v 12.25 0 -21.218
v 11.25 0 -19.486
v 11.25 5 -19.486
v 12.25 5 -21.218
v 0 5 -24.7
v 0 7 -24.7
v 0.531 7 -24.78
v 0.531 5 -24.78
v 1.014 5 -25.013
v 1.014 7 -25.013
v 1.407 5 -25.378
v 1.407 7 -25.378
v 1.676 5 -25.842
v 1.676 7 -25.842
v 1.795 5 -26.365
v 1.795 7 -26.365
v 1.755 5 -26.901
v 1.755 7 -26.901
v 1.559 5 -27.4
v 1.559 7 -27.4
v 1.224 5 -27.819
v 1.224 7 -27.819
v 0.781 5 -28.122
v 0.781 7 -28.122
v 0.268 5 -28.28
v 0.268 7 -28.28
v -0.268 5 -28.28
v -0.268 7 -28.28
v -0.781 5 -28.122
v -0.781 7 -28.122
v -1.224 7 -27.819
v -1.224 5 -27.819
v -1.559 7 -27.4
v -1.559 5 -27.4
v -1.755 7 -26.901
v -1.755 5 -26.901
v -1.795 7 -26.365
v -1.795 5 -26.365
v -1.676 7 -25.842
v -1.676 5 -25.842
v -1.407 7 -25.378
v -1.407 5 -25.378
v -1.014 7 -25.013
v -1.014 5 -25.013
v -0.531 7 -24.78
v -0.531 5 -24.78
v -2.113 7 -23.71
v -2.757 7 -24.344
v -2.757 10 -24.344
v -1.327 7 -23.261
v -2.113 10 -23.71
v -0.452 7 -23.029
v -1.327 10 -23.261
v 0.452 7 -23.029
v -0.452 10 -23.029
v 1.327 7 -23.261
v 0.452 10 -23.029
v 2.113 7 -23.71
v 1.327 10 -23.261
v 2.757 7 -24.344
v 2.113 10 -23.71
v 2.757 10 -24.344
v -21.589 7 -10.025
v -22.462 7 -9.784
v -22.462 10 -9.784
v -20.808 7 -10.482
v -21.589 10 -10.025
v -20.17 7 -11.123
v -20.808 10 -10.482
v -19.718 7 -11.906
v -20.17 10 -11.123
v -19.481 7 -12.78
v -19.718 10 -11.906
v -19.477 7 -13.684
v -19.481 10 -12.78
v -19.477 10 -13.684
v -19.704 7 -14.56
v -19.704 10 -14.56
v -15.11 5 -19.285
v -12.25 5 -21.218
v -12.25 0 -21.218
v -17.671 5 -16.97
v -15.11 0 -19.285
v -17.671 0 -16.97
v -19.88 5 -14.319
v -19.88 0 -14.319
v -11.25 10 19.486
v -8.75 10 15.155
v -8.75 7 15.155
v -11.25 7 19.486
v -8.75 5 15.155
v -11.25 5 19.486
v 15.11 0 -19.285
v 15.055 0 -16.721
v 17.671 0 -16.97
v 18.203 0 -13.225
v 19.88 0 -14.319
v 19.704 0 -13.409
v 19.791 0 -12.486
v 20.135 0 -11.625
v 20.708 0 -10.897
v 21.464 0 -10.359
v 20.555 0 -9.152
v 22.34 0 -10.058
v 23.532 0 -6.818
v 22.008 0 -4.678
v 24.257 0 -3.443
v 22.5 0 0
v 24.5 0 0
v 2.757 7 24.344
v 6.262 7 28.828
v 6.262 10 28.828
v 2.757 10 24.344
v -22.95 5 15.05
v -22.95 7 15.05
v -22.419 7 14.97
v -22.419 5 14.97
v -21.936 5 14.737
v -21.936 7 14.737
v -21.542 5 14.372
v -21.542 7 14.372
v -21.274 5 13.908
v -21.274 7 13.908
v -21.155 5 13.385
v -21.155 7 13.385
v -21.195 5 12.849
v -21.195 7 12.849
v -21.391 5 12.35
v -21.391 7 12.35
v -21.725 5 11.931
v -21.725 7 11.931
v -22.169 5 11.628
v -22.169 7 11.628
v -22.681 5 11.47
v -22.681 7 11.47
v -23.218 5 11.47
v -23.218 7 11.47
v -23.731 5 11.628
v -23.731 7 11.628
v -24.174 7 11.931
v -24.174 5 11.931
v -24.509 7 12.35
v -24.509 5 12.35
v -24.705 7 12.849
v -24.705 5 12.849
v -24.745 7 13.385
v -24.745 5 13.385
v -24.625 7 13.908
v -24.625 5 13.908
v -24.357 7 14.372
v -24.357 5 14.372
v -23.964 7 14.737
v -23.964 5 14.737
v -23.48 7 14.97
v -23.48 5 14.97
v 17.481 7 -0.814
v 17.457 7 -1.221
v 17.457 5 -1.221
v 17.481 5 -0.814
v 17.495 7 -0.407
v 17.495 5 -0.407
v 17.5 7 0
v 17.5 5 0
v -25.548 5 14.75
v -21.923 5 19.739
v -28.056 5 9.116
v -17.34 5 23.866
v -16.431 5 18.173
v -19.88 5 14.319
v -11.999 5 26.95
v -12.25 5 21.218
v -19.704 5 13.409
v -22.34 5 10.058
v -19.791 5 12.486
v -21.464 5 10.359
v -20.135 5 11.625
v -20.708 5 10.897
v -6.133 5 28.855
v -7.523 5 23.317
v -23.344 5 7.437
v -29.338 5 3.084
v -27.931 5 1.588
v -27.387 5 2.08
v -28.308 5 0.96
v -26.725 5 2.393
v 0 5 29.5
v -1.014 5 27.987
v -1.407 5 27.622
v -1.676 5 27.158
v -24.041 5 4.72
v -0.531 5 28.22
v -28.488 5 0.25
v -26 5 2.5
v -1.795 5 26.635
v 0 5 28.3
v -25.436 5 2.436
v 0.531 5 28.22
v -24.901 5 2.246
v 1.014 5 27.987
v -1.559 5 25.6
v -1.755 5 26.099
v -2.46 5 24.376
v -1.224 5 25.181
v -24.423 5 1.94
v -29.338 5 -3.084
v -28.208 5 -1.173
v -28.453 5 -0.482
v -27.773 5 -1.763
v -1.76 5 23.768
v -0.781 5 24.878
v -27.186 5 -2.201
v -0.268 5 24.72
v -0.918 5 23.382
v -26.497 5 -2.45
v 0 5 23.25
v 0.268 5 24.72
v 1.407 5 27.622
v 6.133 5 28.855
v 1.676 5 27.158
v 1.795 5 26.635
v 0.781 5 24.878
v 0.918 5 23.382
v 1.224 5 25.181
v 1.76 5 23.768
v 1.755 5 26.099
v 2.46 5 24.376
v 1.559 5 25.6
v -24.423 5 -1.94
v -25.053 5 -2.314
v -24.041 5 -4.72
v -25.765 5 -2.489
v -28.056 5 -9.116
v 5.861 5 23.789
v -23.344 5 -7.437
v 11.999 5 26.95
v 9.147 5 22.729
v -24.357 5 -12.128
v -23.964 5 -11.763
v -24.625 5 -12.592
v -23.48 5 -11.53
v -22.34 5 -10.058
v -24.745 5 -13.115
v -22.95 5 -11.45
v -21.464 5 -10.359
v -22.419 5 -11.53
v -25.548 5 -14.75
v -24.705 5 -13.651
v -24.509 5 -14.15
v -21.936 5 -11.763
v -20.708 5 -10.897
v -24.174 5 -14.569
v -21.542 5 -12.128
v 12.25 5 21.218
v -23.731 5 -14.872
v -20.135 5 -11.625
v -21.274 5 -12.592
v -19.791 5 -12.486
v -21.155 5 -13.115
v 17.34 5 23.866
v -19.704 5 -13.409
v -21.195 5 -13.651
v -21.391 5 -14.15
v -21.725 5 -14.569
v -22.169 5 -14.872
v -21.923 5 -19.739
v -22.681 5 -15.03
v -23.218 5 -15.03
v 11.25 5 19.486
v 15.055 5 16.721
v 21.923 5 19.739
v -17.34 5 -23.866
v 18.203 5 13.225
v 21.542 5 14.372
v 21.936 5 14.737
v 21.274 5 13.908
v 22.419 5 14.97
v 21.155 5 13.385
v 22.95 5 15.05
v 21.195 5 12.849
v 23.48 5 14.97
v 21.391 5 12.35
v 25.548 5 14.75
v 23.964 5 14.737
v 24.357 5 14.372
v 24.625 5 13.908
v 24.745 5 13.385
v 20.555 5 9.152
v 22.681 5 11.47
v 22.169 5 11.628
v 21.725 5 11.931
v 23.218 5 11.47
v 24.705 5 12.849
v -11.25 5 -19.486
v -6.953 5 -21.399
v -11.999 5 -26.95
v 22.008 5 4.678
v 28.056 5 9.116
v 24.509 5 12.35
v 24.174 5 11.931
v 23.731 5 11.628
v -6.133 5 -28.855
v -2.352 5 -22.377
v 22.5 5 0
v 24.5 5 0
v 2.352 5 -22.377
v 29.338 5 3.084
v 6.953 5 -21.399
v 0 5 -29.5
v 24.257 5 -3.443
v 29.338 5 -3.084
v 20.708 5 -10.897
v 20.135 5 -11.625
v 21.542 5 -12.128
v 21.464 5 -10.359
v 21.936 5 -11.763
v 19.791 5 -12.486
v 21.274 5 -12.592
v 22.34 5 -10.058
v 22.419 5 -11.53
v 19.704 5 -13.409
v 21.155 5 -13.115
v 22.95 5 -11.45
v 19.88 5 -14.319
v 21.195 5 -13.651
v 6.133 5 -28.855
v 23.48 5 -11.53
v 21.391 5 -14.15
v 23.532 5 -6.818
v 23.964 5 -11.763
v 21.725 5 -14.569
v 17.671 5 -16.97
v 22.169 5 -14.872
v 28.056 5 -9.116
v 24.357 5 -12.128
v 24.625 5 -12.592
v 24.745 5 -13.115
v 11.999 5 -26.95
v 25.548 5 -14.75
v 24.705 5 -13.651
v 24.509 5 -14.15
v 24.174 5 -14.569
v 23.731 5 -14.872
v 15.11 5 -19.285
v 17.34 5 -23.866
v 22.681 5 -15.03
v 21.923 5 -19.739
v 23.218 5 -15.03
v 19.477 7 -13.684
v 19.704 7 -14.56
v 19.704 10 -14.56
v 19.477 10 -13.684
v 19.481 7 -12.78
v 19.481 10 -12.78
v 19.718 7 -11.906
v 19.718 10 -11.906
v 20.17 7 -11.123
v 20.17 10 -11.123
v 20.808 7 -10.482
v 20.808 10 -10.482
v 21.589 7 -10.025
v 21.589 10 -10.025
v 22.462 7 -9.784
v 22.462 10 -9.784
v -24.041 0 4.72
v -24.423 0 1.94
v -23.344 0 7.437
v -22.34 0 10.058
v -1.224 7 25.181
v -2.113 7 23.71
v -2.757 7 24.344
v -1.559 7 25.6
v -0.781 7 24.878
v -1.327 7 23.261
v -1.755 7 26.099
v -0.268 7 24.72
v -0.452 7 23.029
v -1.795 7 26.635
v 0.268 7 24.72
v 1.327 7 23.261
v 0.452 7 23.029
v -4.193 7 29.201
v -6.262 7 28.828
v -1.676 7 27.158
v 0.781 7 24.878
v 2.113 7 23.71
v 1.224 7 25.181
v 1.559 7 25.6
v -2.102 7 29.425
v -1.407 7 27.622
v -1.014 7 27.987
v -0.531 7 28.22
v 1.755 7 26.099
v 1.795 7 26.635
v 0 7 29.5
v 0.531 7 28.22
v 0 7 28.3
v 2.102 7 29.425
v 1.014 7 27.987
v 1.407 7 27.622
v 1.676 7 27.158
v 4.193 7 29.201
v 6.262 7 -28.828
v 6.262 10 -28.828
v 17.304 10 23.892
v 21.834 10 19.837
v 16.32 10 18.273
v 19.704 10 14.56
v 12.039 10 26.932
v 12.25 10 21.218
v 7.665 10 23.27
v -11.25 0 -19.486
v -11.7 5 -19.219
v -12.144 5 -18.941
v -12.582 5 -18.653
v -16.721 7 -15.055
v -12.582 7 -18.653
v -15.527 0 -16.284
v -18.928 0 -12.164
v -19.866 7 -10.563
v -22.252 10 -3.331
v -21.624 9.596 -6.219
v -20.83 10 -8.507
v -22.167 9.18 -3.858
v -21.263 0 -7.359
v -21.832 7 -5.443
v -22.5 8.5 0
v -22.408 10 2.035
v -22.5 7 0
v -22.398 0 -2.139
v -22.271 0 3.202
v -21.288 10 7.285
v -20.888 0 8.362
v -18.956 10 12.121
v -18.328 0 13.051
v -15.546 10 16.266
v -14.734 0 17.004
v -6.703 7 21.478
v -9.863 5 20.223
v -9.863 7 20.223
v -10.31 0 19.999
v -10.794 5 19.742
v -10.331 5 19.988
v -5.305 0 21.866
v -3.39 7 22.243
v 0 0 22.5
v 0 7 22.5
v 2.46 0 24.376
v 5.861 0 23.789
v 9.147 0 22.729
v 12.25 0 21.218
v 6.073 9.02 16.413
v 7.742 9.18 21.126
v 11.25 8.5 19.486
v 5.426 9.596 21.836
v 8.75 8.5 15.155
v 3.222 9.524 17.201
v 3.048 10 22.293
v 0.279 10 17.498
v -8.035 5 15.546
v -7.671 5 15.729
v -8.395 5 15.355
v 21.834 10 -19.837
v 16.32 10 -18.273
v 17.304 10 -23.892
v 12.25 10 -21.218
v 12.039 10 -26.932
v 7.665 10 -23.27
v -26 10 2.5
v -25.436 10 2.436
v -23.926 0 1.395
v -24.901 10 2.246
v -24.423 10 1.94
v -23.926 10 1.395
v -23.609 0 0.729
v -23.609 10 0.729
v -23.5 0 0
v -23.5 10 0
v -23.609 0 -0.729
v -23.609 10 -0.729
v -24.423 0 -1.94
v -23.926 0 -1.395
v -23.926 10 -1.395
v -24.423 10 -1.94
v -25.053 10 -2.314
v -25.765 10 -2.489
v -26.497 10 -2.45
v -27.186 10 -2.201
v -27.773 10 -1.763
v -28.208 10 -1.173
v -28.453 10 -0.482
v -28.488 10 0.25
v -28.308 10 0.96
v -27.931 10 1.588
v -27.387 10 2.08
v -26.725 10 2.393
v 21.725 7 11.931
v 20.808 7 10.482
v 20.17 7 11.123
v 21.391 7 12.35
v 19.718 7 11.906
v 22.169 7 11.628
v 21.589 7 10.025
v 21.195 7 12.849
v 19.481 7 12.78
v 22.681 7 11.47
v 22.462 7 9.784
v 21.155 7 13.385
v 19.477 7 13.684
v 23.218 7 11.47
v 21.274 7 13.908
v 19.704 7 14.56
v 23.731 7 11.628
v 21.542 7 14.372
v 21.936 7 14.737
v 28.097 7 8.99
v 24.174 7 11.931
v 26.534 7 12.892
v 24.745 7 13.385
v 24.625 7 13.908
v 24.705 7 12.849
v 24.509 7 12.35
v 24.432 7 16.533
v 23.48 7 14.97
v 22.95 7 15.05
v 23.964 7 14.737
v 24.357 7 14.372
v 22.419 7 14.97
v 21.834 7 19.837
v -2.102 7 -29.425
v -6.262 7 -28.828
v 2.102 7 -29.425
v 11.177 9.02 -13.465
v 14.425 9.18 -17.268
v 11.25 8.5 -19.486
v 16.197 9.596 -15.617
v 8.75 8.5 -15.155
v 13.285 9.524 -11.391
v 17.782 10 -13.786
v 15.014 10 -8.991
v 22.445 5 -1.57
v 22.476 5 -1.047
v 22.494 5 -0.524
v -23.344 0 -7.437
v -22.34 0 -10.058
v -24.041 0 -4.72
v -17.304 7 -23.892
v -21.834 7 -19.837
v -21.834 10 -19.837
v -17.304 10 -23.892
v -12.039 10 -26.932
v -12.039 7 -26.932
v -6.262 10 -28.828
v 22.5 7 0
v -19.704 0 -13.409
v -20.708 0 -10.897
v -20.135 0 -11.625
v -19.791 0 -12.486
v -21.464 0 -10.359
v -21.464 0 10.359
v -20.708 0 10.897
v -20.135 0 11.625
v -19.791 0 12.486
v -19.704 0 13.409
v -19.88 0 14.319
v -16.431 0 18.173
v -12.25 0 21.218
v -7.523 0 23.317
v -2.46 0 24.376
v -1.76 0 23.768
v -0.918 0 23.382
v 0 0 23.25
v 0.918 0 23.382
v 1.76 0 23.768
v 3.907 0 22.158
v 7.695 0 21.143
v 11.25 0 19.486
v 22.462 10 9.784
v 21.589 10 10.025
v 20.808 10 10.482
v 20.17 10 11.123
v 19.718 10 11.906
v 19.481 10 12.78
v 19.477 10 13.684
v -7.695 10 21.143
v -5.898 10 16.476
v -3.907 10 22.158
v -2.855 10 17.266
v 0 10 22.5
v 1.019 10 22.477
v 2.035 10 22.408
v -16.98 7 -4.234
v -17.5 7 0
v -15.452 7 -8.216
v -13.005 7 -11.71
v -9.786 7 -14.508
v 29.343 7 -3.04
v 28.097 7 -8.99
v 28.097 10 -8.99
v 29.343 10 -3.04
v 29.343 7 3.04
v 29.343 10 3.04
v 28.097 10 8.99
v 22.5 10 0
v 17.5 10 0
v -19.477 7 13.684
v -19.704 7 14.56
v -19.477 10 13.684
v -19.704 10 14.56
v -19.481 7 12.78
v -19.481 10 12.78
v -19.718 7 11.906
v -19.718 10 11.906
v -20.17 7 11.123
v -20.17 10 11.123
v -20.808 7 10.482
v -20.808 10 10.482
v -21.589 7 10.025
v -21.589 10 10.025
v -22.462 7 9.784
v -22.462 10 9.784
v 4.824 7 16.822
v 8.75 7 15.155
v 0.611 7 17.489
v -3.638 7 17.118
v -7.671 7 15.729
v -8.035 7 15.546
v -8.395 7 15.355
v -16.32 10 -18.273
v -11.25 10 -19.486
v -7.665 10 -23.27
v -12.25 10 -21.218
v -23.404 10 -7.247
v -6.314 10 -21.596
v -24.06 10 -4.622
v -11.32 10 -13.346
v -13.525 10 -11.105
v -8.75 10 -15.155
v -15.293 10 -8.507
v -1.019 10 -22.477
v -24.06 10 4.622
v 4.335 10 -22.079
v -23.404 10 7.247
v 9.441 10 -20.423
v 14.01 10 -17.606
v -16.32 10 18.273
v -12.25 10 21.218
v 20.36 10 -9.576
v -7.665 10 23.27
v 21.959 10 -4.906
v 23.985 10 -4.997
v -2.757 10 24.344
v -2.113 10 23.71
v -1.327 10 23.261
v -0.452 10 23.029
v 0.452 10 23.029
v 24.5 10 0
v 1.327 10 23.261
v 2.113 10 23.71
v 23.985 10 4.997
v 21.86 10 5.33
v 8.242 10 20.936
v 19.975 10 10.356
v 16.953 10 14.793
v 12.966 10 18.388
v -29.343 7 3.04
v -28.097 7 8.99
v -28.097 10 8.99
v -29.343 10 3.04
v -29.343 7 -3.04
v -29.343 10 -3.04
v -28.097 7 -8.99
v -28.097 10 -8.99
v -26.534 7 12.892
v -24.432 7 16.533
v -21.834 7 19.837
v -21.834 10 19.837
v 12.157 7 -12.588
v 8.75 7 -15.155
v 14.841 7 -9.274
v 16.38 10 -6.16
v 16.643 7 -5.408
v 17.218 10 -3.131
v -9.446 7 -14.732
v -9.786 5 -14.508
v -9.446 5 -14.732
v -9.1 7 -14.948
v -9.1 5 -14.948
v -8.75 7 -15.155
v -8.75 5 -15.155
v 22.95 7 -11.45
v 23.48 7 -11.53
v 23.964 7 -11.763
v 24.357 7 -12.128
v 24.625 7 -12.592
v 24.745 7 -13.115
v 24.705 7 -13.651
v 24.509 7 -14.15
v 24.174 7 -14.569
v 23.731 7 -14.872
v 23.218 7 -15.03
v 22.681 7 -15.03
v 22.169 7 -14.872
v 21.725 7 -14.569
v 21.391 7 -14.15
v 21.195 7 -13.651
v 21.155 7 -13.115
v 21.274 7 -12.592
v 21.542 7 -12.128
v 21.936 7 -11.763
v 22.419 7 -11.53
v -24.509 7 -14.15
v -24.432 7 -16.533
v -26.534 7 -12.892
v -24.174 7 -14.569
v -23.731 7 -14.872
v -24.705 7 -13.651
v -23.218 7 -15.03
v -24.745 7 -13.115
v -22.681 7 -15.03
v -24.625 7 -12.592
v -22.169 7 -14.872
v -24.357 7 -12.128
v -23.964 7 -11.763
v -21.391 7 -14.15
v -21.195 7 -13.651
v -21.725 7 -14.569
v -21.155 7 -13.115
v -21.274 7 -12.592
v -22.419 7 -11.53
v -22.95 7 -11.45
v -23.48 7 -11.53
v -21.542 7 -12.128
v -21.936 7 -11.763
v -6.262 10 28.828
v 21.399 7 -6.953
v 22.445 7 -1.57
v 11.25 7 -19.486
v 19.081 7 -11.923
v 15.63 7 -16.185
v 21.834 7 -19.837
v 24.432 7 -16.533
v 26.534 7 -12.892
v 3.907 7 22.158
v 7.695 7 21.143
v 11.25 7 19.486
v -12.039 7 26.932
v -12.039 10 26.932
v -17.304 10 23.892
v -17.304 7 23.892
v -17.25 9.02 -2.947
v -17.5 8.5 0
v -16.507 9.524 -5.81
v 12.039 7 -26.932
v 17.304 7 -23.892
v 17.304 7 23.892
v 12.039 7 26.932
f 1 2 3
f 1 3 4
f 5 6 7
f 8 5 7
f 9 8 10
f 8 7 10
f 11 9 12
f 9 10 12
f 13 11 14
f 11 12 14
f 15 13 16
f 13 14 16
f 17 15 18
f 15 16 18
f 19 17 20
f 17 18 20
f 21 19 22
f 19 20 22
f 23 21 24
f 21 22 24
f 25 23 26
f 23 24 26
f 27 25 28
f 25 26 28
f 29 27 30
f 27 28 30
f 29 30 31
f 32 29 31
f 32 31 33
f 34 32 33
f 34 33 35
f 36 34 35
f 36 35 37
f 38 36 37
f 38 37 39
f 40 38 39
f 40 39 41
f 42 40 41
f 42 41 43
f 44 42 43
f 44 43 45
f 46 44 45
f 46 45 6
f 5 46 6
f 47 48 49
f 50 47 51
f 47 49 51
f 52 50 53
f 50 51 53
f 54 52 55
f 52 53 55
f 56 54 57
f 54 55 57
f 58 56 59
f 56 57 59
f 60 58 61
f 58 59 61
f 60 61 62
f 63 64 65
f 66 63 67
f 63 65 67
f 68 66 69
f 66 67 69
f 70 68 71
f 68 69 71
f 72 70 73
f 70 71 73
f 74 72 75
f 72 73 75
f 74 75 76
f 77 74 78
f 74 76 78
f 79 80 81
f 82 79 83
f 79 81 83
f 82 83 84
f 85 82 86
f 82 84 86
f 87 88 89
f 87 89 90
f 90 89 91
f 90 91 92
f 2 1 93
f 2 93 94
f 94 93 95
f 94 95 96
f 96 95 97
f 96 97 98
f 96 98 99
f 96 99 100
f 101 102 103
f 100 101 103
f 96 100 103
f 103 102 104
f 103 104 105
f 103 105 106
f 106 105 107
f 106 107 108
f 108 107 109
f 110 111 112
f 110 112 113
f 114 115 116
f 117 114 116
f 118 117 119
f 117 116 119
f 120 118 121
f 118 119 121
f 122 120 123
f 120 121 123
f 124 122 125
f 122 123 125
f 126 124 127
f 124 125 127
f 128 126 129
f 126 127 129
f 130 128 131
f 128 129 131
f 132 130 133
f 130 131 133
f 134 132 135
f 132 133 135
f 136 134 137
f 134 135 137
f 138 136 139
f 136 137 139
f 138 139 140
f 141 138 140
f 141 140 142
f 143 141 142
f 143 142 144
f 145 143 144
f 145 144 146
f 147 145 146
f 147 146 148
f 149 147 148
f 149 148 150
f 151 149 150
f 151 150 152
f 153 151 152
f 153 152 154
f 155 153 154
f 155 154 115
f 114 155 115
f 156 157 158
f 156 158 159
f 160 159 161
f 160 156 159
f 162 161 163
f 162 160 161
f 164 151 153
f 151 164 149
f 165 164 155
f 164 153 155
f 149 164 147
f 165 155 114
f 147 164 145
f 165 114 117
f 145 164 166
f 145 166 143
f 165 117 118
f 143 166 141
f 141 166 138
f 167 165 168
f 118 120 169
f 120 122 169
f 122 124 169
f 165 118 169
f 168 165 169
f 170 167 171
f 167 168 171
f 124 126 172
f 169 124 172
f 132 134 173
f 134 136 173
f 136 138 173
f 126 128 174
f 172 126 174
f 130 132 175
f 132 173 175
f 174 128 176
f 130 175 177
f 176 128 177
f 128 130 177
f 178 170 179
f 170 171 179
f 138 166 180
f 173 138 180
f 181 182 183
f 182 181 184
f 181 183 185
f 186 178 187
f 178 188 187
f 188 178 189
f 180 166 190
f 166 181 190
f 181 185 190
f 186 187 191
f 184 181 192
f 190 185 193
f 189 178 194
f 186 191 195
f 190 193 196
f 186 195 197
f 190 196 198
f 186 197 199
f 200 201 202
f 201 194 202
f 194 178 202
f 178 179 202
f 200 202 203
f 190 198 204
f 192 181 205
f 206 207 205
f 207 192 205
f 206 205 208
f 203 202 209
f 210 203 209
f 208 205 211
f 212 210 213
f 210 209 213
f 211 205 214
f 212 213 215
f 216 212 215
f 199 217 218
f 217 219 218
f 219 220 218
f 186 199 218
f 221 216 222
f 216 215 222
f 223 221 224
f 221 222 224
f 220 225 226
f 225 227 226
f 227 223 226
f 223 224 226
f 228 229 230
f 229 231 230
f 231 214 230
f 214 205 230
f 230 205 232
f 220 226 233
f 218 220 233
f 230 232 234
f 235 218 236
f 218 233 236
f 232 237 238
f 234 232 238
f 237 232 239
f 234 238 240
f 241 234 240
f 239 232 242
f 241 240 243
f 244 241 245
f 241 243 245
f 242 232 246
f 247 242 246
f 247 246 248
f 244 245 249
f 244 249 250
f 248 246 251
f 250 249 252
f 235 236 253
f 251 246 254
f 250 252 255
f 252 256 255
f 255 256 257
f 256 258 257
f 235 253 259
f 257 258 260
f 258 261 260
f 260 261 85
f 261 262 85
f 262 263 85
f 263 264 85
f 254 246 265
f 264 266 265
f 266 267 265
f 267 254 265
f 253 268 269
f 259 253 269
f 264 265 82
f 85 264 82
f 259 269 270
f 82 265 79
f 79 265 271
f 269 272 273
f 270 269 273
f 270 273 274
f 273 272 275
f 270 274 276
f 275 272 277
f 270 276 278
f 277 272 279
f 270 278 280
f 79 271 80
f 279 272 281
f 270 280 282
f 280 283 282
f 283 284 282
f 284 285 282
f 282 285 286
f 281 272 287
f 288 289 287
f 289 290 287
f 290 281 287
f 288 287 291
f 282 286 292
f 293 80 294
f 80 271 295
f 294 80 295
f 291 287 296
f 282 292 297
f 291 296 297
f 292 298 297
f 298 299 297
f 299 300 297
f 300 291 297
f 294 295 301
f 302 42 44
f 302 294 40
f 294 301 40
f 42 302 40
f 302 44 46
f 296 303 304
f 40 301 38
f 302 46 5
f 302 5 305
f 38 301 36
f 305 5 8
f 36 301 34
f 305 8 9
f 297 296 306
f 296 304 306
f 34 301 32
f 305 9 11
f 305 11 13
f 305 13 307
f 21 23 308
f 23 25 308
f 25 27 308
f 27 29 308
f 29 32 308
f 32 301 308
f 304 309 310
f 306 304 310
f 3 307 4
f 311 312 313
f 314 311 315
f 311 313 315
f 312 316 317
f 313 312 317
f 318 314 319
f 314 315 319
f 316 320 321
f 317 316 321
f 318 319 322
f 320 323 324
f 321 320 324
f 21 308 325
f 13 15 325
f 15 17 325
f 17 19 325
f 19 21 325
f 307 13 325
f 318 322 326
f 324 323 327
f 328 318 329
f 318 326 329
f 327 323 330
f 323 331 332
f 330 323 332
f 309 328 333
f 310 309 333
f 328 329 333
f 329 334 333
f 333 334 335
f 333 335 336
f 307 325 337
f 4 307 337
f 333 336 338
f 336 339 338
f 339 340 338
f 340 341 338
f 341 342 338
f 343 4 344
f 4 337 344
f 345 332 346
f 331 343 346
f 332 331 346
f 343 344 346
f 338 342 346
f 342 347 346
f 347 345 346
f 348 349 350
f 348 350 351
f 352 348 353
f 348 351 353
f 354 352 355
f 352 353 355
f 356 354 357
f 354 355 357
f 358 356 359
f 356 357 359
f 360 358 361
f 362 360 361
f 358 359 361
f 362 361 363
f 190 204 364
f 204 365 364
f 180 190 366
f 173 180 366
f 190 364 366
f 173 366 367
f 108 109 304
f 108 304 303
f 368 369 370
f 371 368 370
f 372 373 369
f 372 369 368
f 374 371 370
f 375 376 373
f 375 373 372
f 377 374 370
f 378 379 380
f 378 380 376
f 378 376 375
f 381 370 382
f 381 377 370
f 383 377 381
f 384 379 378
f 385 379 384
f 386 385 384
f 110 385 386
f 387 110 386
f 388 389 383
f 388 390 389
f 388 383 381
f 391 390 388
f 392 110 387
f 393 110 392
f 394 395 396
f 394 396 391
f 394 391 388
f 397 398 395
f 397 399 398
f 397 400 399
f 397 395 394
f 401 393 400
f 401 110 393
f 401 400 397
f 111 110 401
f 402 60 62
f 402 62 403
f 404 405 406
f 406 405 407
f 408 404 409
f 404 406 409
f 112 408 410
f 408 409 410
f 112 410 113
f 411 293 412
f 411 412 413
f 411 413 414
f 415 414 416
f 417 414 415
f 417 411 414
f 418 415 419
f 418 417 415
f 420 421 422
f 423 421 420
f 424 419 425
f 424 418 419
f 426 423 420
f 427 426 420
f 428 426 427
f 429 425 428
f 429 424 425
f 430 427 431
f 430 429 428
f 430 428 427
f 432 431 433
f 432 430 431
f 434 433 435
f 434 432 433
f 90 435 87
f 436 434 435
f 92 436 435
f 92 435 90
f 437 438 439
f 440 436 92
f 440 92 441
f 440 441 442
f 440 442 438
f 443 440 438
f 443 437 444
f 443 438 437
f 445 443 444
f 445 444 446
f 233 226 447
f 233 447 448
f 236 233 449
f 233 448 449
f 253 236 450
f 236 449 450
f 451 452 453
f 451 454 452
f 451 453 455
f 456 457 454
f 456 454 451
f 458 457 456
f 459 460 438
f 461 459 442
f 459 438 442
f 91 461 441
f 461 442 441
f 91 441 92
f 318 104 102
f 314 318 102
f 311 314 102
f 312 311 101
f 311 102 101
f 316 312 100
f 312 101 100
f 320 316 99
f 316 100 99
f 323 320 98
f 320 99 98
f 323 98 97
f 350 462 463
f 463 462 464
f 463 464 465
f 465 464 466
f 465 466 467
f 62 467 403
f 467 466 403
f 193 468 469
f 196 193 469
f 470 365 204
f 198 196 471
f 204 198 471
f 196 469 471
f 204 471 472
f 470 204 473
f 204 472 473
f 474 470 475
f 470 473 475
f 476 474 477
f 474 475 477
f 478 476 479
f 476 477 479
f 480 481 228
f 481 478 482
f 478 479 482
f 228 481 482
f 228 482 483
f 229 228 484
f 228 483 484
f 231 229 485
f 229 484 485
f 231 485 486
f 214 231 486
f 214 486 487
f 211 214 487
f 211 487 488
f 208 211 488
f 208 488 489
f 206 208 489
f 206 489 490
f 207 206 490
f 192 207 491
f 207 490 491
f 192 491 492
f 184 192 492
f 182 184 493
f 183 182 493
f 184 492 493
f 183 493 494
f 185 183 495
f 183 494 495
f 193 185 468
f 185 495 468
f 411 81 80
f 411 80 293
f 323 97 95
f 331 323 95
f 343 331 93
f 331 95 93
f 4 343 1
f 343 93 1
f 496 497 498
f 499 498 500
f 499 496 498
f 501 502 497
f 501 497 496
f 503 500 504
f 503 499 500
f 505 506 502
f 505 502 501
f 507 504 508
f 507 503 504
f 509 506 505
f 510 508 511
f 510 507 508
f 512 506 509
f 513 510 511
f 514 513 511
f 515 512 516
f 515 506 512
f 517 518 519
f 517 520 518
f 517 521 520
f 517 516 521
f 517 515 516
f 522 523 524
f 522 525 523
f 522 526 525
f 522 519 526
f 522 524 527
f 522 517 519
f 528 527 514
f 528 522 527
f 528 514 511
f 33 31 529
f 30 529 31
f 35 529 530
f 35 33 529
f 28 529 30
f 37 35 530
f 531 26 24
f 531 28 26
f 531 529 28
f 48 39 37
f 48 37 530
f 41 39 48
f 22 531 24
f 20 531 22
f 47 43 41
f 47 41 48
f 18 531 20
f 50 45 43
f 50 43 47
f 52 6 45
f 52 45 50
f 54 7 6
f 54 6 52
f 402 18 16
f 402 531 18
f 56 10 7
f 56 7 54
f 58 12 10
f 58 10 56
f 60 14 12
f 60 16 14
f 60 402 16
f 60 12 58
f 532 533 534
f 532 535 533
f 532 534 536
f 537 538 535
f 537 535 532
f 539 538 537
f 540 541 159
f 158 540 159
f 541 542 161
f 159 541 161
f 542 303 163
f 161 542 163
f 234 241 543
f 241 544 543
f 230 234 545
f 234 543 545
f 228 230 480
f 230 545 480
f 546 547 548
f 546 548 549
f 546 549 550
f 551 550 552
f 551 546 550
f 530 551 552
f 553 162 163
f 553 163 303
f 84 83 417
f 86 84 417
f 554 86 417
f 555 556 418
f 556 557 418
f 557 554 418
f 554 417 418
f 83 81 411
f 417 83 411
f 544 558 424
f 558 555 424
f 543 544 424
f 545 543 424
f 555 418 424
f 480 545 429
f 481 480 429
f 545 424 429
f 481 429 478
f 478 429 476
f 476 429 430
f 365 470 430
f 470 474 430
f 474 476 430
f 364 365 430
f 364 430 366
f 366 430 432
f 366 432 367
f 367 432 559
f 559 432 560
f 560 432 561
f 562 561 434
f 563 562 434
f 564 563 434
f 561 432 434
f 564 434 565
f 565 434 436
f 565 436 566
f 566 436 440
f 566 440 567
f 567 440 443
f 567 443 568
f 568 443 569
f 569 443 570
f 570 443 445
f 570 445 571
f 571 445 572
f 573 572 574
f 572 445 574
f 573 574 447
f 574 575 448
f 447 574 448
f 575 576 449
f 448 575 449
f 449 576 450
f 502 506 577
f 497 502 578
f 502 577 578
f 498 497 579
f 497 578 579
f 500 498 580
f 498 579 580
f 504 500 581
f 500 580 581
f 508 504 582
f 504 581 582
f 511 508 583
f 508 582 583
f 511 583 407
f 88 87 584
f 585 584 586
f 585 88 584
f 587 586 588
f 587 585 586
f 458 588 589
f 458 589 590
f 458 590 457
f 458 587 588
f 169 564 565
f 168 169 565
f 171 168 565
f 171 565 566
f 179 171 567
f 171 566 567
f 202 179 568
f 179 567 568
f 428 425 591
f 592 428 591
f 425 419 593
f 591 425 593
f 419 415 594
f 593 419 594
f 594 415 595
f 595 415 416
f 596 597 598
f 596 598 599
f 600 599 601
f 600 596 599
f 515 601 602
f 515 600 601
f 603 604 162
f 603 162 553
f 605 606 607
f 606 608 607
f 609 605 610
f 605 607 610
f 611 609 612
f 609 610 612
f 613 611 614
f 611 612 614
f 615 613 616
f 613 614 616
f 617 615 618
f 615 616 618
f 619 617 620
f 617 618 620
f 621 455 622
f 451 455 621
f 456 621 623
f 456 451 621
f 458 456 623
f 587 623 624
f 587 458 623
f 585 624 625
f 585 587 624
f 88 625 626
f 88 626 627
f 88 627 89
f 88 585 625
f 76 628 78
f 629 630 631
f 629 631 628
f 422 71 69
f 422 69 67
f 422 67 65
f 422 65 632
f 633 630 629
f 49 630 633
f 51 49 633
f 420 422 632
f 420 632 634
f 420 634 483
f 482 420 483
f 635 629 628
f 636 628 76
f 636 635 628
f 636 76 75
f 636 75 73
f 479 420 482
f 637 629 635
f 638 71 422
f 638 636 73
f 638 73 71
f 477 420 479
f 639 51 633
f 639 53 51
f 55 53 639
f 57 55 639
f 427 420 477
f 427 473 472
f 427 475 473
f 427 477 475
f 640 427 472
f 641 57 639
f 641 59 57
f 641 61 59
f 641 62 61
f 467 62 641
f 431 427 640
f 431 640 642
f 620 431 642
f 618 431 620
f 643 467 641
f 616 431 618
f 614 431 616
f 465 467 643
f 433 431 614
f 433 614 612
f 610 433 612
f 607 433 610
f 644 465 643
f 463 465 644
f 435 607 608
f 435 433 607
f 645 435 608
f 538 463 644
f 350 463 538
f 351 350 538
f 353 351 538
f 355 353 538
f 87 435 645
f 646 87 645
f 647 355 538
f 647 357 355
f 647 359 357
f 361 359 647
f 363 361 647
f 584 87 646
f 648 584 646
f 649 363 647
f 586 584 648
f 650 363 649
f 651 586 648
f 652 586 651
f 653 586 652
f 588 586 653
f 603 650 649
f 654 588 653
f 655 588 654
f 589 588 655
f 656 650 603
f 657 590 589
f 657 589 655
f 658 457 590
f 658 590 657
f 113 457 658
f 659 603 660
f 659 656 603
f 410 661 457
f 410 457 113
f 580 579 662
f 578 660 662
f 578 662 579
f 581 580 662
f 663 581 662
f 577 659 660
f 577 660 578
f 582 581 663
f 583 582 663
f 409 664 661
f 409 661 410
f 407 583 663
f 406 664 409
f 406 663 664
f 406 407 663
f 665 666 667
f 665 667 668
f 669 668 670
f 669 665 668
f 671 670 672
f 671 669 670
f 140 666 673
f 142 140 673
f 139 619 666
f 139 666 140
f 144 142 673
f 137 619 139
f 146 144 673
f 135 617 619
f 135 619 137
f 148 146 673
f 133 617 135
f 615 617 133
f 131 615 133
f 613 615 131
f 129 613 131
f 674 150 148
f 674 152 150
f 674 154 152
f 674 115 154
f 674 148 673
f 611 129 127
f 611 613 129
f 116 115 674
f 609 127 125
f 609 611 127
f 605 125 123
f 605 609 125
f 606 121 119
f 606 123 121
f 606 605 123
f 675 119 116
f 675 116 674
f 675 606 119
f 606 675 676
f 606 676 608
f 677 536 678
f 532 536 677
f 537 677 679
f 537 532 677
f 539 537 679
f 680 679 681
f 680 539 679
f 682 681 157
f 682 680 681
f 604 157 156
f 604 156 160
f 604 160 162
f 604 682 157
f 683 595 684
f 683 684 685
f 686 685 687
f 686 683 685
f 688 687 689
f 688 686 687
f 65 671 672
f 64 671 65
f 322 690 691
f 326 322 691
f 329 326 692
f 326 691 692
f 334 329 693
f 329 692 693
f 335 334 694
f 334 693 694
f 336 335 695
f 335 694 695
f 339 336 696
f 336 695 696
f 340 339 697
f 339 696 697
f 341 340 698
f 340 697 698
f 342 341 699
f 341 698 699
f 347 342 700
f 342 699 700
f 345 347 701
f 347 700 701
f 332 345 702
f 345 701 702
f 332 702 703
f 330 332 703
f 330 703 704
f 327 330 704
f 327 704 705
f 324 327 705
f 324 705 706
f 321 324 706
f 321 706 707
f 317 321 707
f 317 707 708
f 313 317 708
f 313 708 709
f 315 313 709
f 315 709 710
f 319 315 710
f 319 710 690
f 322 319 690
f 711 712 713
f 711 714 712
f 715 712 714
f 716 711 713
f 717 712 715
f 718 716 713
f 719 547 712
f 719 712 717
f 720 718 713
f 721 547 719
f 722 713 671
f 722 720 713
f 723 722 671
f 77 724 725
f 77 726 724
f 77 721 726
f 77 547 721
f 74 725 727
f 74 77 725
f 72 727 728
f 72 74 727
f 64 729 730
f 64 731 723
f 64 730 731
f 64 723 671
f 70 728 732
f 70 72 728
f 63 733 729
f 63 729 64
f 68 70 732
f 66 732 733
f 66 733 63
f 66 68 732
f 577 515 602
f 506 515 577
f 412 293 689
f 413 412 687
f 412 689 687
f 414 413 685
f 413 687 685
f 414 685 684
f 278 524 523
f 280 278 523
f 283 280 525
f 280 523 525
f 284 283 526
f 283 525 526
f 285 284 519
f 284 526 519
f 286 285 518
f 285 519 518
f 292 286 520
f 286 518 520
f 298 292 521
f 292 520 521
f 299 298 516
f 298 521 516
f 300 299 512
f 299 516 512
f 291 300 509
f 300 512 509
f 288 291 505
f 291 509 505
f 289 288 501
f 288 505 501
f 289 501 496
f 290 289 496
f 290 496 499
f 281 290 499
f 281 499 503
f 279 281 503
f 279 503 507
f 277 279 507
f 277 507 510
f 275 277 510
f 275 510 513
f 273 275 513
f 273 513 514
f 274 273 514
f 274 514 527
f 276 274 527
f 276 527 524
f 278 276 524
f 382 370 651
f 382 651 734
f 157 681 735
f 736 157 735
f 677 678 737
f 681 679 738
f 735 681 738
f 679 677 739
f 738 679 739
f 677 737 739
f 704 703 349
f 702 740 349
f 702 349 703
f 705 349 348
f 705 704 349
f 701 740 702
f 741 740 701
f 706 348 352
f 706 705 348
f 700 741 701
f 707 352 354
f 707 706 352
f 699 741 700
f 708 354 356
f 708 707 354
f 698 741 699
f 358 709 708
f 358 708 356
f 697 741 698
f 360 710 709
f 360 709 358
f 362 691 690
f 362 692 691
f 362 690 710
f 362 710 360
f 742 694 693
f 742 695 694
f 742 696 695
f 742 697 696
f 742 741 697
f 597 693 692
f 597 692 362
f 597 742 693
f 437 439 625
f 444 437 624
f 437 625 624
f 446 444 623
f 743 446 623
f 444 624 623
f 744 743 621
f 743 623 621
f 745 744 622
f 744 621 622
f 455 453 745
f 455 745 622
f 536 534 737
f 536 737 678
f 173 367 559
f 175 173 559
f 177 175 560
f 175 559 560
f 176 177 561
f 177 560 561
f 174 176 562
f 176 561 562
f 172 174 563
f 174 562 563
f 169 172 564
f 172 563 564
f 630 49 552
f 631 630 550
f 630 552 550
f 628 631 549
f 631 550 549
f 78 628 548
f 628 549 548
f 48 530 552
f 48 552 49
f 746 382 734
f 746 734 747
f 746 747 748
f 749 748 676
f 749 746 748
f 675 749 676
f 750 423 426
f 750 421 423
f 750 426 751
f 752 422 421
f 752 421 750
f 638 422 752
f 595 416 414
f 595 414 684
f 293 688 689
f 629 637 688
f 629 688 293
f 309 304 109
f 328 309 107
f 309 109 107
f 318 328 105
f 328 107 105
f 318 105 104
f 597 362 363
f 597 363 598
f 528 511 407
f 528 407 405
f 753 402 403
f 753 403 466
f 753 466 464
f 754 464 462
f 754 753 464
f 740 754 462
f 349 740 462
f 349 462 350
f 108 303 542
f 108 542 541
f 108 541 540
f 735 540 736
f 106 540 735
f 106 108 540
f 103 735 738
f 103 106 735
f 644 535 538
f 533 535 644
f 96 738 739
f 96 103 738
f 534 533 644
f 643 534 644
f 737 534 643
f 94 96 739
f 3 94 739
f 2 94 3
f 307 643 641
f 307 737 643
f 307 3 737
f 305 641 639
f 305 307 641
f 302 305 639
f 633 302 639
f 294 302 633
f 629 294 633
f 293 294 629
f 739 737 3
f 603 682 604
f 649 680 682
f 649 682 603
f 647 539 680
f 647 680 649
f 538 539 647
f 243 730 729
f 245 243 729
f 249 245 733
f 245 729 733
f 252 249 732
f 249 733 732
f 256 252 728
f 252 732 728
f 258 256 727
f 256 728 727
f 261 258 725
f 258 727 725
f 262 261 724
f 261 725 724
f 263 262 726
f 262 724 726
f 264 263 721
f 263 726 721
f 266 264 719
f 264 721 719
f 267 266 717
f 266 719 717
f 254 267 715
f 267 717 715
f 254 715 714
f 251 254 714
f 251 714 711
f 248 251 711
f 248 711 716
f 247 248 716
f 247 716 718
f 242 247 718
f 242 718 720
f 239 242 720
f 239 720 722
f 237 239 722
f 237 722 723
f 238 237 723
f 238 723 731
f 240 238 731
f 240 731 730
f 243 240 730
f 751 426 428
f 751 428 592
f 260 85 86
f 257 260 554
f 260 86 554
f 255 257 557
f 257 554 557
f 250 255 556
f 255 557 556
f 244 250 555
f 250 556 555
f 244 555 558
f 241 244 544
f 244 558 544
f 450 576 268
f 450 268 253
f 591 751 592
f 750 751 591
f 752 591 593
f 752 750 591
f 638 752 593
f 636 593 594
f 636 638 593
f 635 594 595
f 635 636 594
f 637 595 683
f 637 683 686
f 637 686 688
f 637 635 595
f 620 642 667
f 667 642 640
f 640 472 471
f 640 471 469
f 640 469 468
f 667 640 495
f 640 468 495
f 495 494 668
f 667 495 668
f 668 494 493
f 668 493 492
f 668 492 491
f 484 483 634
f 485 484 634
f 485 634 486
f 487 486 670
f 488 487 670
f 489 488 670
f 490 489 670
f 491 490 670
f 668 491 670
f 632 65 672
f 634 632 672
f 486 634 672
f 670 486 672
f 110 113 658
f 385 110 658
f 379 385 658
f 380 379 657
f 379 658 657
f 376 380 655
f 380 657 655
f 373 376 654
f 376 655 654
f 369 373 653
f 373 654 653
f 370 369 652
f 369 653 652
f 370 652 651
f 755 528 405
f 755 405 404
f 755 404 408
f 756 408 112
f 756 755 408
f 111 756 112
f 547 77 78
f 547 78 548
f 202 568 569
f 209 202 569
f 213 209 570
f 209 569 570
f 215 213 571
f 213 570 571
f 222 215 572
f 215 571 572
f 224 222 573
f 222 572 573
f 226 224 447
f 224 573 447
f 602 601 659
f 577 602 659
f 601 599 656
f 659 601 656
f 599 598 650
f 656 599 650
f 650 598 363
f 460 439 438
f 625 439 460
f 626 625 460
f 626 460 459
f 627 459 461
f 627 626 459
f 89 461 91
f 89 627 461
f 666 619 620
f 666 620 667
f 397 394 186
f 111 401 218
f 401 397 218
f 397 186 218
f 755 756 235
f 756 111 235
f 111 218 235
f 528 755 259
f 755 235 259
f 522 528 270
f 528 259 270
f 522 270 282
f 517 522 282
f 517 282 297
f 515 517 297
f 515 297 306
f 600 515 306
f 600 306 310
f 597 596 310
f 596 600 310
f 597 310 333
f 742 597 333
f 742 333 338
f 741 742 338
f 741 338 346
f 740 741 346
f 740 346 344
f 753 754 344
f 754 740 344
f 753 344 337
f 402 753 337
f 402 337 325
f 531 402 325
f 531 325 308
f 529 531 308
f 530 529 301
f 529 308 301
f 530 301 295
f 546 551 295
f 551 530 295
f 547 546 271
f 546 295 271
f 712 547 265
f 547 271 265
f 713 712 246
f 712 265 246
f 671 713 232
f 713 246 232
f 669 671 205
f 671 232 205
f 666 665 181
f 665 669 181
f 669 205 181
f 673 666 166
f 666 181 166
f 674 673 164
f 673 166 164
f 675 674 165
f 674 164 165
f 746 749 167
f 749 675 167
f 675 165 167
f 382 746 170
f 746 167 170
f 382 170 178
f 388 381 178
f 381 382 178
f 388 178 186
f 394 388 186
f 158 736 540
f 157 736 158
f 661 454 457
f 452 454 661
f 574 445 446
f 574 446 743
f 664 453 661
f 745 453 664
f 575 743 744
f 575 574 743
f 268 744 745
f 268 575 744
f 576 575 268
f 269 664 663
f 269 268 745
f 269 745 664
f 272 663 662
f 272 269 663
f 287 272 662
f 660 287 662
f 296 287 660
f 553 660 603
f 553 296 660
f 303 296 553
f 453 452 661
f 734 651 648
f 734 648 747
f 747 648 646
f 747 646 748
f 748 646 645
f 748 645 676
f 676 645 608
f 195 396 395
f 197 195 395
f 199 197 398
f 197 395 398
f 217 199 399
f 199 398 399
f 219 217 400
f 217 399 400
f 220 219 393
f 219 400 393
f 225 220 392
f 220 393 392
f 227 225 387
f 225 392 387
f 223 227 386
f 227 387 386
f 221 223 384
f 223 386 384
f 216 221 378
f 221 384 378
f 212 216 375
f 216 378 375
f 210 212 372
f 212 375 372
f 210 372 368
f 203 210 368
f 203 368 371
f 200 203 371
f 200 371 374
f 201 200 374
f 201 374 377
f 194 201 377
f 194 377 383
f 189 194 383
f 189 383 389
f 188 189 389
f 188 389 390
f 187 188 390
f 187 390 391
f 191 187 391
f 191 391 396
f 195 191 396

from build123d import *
from build123d.topology import SkipClean

# Parameters (mm, degrees)
SKETCH2_R             = 24.5
SKETCH2_R_2           = 22.5
BOSS_EXTRUDE1_DEPTH   = 10
BOSS_EXTRUDE2_START   = -5
SKETCH3_R             = 29.5
SKETCH3_R_2           = 24.5
BOSS_EXTRUDE2_DEPTH   = 2
CUT_EXTRUDE1_REACH    = 44.302
SKETCH5_R             = 1.8
SKETCH6_R             = 3.5
CUT_EXTRUDE2_DEPTH    = 3
SKETCH7_R             = 3.25
CUT_EXTRUDE3_DEPTH    = 5
BOSS_EXTRUDE3_DEPTH   = 3
BOSS_EXTRUDE3_2_DEPTH = 3
BOSS_EXTRUDE3_3_DEPTH = 3
BOSS_EXTRUDE4_DEPTH   = 2
CHAMFER1_SIZE         = 1.5
CHAMFER1_SIZE2        = 8.506922729
CHAMFER2_SIZE         = 1.5
CHAMFER2_SIZE2        = 8.506922729
CHAMFER3_SIZE         = 1.5
CHAMFER3_SIZE2        = 8.506922729
CUT_EXTRUDE4_DEPTH    = 5
BOSS_EXTRUDE5_START   = -3
BOSS_EXTRUDE5_DEPTH   = 3
SKETCH14_R            = 2.5
CUT_EXTRUDE5_DEPTH    = 43.901048938


with BuildPart() as part:
    # Sketch2 → Boss-Extrude1 (new body)
    with BuildSketch(Plane(origin=(0, 0, 0), x_dir=(1, 0, 0), z_dir=(0, 1, 0))):
        with Locations(Location((0, 0, 0), (0, 0, 270))):
            Circle(SKETCH2_R)
        with Locations(Location((0, 0, 0), (0, 0, 270))):
            Circle(SKETCH2_R_2, mode=Mode.SUBTRACT)
    extrude(amount=BOSS_EXTRUDE1_DEPTH)

    # Sketch3 → Boss-Extrude2 (add)
    with BuildSketch(Plane(origin=(0, 10, 0), x_dir=(1, 0, 0), z_dir=(0, 1, 0)).offset(BOSS_EXTRUDE2_START)):
        with Locations(Location((0, 0, 0), (0, 0, 270))):
            Circle(SKETCH3_R)
        with Locations(Location((0, 0, 0), (0, 0, 270))):
            Circle(SKETCH3_R_2, mode=Mode.SUBTRACT)
    extrude(amount=BOSS_EXTRUDE2_DEPTH)

    # Sketch5 → Cut-Extrude1 (cut, up to next)
    with BuildSketch(Plane(origin=(0, 7, 0), x_dir=(1, 0, 0), z_dir=(0, 1, 0)), mode=Mode.PRIVATE) as cut_extrude1_sk1:
        with Locations(Location((0, 26.5, 0), (0, 0, 270))):
            Circle(SKETCH5_R)
    cut_extrude1_tool1 = extrude(cut_extrude1_sk1.sketch, amount=-CUT_EXTRUDE1_REACH, mode=Mode.PRIVATE) & part.part
    # Sketch5 → Cut-Extrude1 (cut, up to next)
    with BuildSketch(Plane(origin=(0, 7, 0), x_dir=(1, 0, 0), z_dir=(0, 1, 0)), mode=Mode.PRIVATE) as cut_extrude1_sk2:
        with Locations(Location((22.9496732, 13.25, 0), (0, 0, 270))):
            Circle(SKETCH5_R)
    cut_extrude1_tool2 = extrude(cut_extrude1_sk2.sketch, amount=-CUT_EXTRUDE1_REACH, mode=Mode.PRIVATE) & part.part
    # Sketch5 → Cut-Extrude1 (cut, up to next)
    with BuildSketch(Plane(origin=(0, 7, 0), x_dir=(1, 0, 0), z_dir=(0, 1, 0)), mode=Mode.PRIVATE) as cut_extrude1_sk3:
        with Locations(Location((22.9496732, -13.25, 0), (0, 0, 270))):
            Circle(SKETCH5_R)
    cut_extrude1_tool3 = extrude(cut_extrude1_sk3.sketch, amount=-CUT_EXTRUDE1_REACH, mode=Mode.PRIVATE) & part.part
    # Sketch5 → Cut-Extrude1 (cut, up to next)
    with BuildSketch(Plane(origin=(0, 7, 0), x_dir=(1, 0, 0), z_dir=(0, 1, 0)), mode=Mode.PRIVATE) as cut_extrude1_sk4:
        with Locations(Location((0, -26.5, 0), (0, 0, 270))):
            Circle(SKETCH5_R)
    cut_extrude1_tool4 = extrude(cut_extrude1_sk4.sketch, amount=-CUT_EXTRUDE1_REACH, mode=Mode.PRIVATE) & part.part
    # Sketch5 → Cut-Extrude1 (cut, up to next)
    with BuildSketch(Plane(origin=(0, 7, 0), x_dir=(1, 0, 0), z_dir=(0, 1, 0)), mode=Mode.PRIVATE) as cut_extrude1_sk5:
        with Locations(Location((-22.9496732, -13.25, 0), (0, 0, 270))):
            Circle(SKETCH5_R)
    cut_extrude1_tool5 = extrude(cut_extrude1_sk5.sketch, amount=-CUT_EXTRUDE1_REACH, mode=Mode.PRIVATE) & part.part
    # Sketch5 → Cut-Extrude1 (cut, up to next)
    with BuildSketch(Plane(origin=(0, 7, 0), x_dir=(1, 0, 0), z_dir=(0, 1, 0)), mode=Mode.PRIVATE) as cut_extrude1_sk6:
        with Locations(Location((-22.9496732, 13.25, 0), (0, 0, 270))):
            Circle(SKETCH5_R)
    cut_extrude1_tool6 = extrude(cut_extrude1_sk6.sketch, amount=-CUT_EXTRUDE1_REACH, mode=Mode.PRIVATE) & part.part
    add(cut_extrude1_tool1.solids().sort_by_distance((0, 7, -26.5))[0], mode=Mode.SUBTRACT)
    add(cut_extrude1_tool2.solids().sort_by_distance((22.949673, 7, -13.25))[0], mode=Mode.SUBTRACT)
    add(cut_extrude1_tool3.solids().sort_by_distance((22.949673, 7, 13.25))[0], mode=Mode.SUBTRACT)
    add(cut_extrude1_tool4.solids().sort_by_distance((0, 7, 26.5))[0], mode=Mode.SUBTRACT)
    add(cut_extrude1_tool5.solids().sort_by_distance((-22.949673, 7, 13.25))[0], mode=Mode.SUBTRACT)
    add(cut_extrude1_tool6.solids().sort_by_distance((-22.949673, 7, -13.25))[0], mode=Mode.SUBTRACT)

    # Sketch6 → Cut-Extrude2 (cut)
    with BuildSketch(Plane(origin=(0, 10, 0), x_dir=(1, 0, 0), z_dir=(0, 1, 0))):
        with Locations((0, 26.5)):
            Circle(SKETCH6_R)
        with Locations((22.9496732, 13.25)):
            Circle(SKETCH6_R)
        with Locations((22.9496732, -13.25)):
            Circle(SKETCH6_R)
        with Locations((0, -26.5)):
            Circle(SKETCH6_R)
        with Locations((-22.9496732, -13.25)):
            Circle(SKETCH6_R)
        with Locations((-22.9496732, 13.25)):
            Circle(SKETCH6_R)
    extrude(amount=-CUT_EXTRUDE2_DEPTH, mode=Mode.SUBTRACT)

    # Sketch7 → Cut-Extrude3 (cut)
    with BuildSketch(Plane.XZ):
        with Locations((0, 26.5)):
            Circle(SKETCH7_R)
        with Locations((22.9496732, 13.25)):
            Circle(SKETCH7_R)
        with Locations((22.9496732, -13.25)):
            Circle(SKETCH7_R)
        with Locations((0, -26.5)):
            Circle(SKETCH7_R)
        with Locations((-22.9496732, -13.25)):
            Circle(SKETCH7_R)
        with Locations((-22.9496732, 13.25)):
            Circle(SKETCH7_R)
    extrude(amount=-CUT_EXTRUDE3_DEPTH, mode=Mode.SUBTRACT)



with BuildPart() as body_2:
    # Sketch8 → Boss-Extrude3 (new body)
    with BuildSketch(Plane(origin=(0, 10, 0), x_dir=(1, 0, 0), z_dir=(0, 1, 0))):
        with BuildLine():
            Line((-8.75, 15.155444566), (-11.25, 19.485571585))
            ThreePointArc((-11.25, 19.485571585), (-19.485571585, 11.25), (-22.5, 0))
            Line((-22.5, 0), (-17.5, 0))
            ThreePointArc((-17.5, 0), (-15.155444566, 8.75), (-8.75, 15.155444566))
        make_face()
    extrude(amount=-BOSS_EXTRUDE3_DEPTH)


with BuildPart() as body_3:
    # Sketch8 → Boss-Extrude3 2 (new body)
    with BuildSketch(Plane(origin=(0, 10, 0), x_dir=(1, 0, 0), z_dir=(0, 1, 0))):
        with BuildLine():
            Line((17.5, 0), (22.5, 0))
            ThreePointArc((22.5, 0), (19.485571585, 11.25), (11.25, 19.485571585))
            Line((11.25, 19.485571585), (8.75, 15.155444566))
            ThreePointArc((8.75, 15.155444566), (15.155444566, 8.75), (17.5, 0))
        make_face()
    extrude(amount=-BOSS_EXTRUDE3_2_DEPTH)

    # Chamfer3
    chamfer3_edges = [body_3.edges().sort_by_distance(p)[0] for p in [
        (10, 10, -17.320508076),
    ]]
    chamfer3_side = [body_3.faces().sort_by_distance(p)[0] for p in [
        (10, 8.5, -17.320508076),
    ]]
    chamfer(chamfer3_edges, length=CHAMFER3_SIZE, length2=CHAMFER3_SIZE2, reference=chamfer3_side[0])



with BuildPart() as body_4:
    # Sketch8 → Boss-Extrude3 3 (new body)
    with BuildSketch(Plane(origin=(0, 10, 0), x_dir=(1, 0, 0), z_dir=(0, 1, 0))):
        with BuildLine():
            Line((-8.75, -15.155444566), (-11.25, -19.485571585))
            ThreePointArc((-11.25, -19.485571585), (0, -22.5), (11.25, -19.485571585))
            Line((11.25, -19.485571585), (8.75, -15.155444566))
            ThreePointArc((8.75, -15.155444566), (0, -17.5), (-8.75, -15.155444566))
        make_face()
    extrude(amount=-BOSS_EXTRUDE3_3_DEPTH)

    # Chamfer2
    chamfer2_edges = [body_4.edges().sort_by_distance(p)[0] for p in [
        (10, 10, 17.320508076),
    ]]
    chamfer2_side = [body_4.faces().sort_by_distance(p)[0] for p in [
        (10, 8.5, 17.320508076),
    ]]
    chamfer(chamfer2_edges, length=CHAMFER2_SIZE, length2=CHAMFER2_SIZE2, reference=chamfer2_side[0])


with BuildPart() as part_1:
    add(part.part)

    add(body_2.part)  # Boss-Extrude4 merges body 2
    # Sketch9 → Boss-Extrude4 (add)
    with BuildSketch(Plane.XZ.offset(-7)):
        with BuildLine():
            Line((-8.75, -15.155444566), (-11.25, -19.485571585))
            ThreePointArc((-11.25, -19.485571585), (-11.923183918, -19.081081845), (-12.581841272, -18.653344746))
            Line((-12.581841272, -18.653344746), (-9.785876755, -14.508156883))
            ThreePointArc((-9.785876755, -14.508156883), (-9.273587596, -14.840841364), (-8.75, -15.155444566))
        make_face()
        with BuildLine():
            Line((-8.75, 15.155444566), (-11.25, 19.485571585))
            ThreePointArc((-11.25, 19.485571585), (-10.563109651, 19.866321089), (-9.863349779, 20.222866541))
            Line((-9.863349779, 20.222866541), (-7.671494045, 15.728896309))
            ThreePointArc((-7.671494045, 15.728896309), (-8.215751837, 15.451583125), (-8.75, 15.155444566))
        make_face()
        with BuildLine():
            Line((17.5, 0), (22.5, 0))
            ThreePointArc((22.5, 0), (22.486293568, -0.785239244), (22.445191051, -1.569521795))
            Line((22.445191051, -1.569521795), (17.4573708, -1.220739427))
            ThreePointArc((17.4573708, -1.220739427), (17.489339433, -0.610741761), (17.5, 0))
        make_face()
    extrude(amount=BOSS_EXTRUDE4_DEPTH)

    # Chamfer1
    chamfer1_edges = [part_1.edges().sort_by_distance(p)[0] for p in [
        (-20, 10, 0),
    ]]
    chamfer1_side = [part_1.faces().sort_by_distance(p)[0] for p in [
        (-20, 8.5, 0),
    ]]
    chamfer(chamfer1_edges, length=CHAMFER1_SIZE, length2=CHAMFER1_SIZE2, reference=chamfer1_side[0])

    # Sketch12 → Cut-Extrude4 (cut)
    with BuildSketch(Plane(origin=(0, 0, 0), x_dir=(-1, 0, 0), z_dir=(0, -1, 0))):
        with BuildLine():
            Line((-24.5, 0), (-22.5, 0))
            ThreePointArc((-22.5, 0), (-19.485571585, -11.25), (-11.25, -19.485571585))
            Line((-11.25, -19.485571585), (-12.25, -21.217622393))
            ThreePointArc((-12.25, -21.217622393), (-21.217622393, -12.25), (-24.5, 0))
        make_face()
        with BuildLine():
            Line((12.25, 21.217622393), (11.25, 19.485571585))
            ThreePointArc((11.25, 19.485571585), (0, 22.5), (-11.25, 19.485571585))
            Line((-11.25, 19.485571585), (-12.25, 21.217622393))
            ThreePointArc((-12.25, 21.217622393), (0, 24.5), (12.25, 21.217622393))
        make_face()
    extrude(amount=-CUT_EXTRUDE4_DEPTH, mode=Mode.SUBTRACT)


with BuildPart() as body_3_1:
    with SkipClean():  # the faces are left unmerged after this step: merging them gives an invalid solid
        add(body_3.part)

        add(part_1.part)  # Boss-Extrude5 merges part

        add(body_4.part)  # Boss-Extrude5 merges body 4
        # Sketch13 → Boss-Extrude5 (add)
        with BuildSketch(Plane(origin=(0, 10, 0), x_dir=(1, 0, 0), z_dir=(0, 1, 0)).offset(BOSS_EXTRUDE5_START)):
            with BuildLine():
                Line((-19.704128014, 14.560128407), (-21.834307178, 19.837162853))
                ThreePointArc((-21.834307178, 19.837162853), (-14.75, 25.547749412), (-6.262333381, 28.827646117))
                Line((-6.262333381, 28.827646117), (-2.757377076, 24.344339623))
                ThreePointArc((-2.757377076, 24.344339623), (-12.25, 21.217622393), (-19.704128014, 14.560128407))
            make_face()
            with BuildLine():
                Line((2.757377076, 24.344339623), (6.262333381, 28.827646117))
                ThreePointArc((6.262333381, 28.827646117), (14.75, 25.547749412), (21.834307178, 19.837162853))
                Line((21.834307178, 19.837162853), (19.704128014, 14.560128407))
                ThreePointArc((19.704128014, 14.560128407), (12.25, 21.217622393), (2.757377076, 24.344339623))
            make_face()
            with BuildLine():
                Line((22.461505089, 9.784211216), (28.096640559, 8.990483263))
                ThreePointArc((28.096640559, 8.990483263), (29.5, 0), (28.096640559, -8.990483263))
                Line((28.096640559, -8.990483263), (22.461505089, -9.784211216))
                ThreePointArc((22.461505089, -9.784211216), (24.5, 0), (22.461505089, 9.784211216))
            make_face()
            with BuildLine():
                Line((19.704128014, -14.560128407), (21.834307178, -19.837162853))
                ThreePointArc((21.834307178, -19.837162853), (14.75, -25.547749412), (6.262333381, -28.827646117))
                Line((6.262333381, -28.827646117), (2.757377076, -24.344339623))
                ThreePointArc((2.757377076, -24.344339623), (12.25, -21.217622393), (19.704128014, -14.560128407))
            make_face()
            with BuildLine():
                Line((-2.757377076, -24.344339623), (-6.262333381, -28.827646117))
                ThreePointArc((-6.262333381, -28.827646117), (-14.75, -25.547749412), (-21.834307178, -19.837162853))
                Line((-21.834307178, -19.837162853), (-19.704128014, -14.560128407))
                ThreePointArc((-19.704128014, -14.560128407), (-12.25, -21.217622393), (-2.757377076, -24.344339623))
            make_face()
            with BuildLine():
                Line((-22.461505089, -9.784211216), (-28.096640559, -8.990483263))
                ThreePointArc((-28.096640559, -8.990483263), (-29.5, 0), (-28.096640559, 8.990483263))
                Line((-28.096640559, 8.990483263), (-22.461505089, 9.784211216))
                ThreePointArc((-22.461505089, 9.784211216), (-24.5, 0), (-22.461505089, -9.784211216))
            make_face()
        extrude(amount=BOSS_EXTRUDE5_DEPTH)

    # Sketch14 → Cut-Extrude5 (cut, through all)
    with SkipClean():  # the faces are left unmerged after this step: merging them gives an invalid solid
        with BuildSketch(Plane(origin=(0, 10, 0), x_dir=(1, 0, 0), z_dir=(0, 1, 0))):
            with Locations(Location((-26, 0, 0), (0, 0, 270))):
                Circle(SKETCH14_R)
        extrude(amount=-CUT_EXTRUDE5_DEPTH, mode=Mode.SUBTRACT)


solid = body_3_1.part
